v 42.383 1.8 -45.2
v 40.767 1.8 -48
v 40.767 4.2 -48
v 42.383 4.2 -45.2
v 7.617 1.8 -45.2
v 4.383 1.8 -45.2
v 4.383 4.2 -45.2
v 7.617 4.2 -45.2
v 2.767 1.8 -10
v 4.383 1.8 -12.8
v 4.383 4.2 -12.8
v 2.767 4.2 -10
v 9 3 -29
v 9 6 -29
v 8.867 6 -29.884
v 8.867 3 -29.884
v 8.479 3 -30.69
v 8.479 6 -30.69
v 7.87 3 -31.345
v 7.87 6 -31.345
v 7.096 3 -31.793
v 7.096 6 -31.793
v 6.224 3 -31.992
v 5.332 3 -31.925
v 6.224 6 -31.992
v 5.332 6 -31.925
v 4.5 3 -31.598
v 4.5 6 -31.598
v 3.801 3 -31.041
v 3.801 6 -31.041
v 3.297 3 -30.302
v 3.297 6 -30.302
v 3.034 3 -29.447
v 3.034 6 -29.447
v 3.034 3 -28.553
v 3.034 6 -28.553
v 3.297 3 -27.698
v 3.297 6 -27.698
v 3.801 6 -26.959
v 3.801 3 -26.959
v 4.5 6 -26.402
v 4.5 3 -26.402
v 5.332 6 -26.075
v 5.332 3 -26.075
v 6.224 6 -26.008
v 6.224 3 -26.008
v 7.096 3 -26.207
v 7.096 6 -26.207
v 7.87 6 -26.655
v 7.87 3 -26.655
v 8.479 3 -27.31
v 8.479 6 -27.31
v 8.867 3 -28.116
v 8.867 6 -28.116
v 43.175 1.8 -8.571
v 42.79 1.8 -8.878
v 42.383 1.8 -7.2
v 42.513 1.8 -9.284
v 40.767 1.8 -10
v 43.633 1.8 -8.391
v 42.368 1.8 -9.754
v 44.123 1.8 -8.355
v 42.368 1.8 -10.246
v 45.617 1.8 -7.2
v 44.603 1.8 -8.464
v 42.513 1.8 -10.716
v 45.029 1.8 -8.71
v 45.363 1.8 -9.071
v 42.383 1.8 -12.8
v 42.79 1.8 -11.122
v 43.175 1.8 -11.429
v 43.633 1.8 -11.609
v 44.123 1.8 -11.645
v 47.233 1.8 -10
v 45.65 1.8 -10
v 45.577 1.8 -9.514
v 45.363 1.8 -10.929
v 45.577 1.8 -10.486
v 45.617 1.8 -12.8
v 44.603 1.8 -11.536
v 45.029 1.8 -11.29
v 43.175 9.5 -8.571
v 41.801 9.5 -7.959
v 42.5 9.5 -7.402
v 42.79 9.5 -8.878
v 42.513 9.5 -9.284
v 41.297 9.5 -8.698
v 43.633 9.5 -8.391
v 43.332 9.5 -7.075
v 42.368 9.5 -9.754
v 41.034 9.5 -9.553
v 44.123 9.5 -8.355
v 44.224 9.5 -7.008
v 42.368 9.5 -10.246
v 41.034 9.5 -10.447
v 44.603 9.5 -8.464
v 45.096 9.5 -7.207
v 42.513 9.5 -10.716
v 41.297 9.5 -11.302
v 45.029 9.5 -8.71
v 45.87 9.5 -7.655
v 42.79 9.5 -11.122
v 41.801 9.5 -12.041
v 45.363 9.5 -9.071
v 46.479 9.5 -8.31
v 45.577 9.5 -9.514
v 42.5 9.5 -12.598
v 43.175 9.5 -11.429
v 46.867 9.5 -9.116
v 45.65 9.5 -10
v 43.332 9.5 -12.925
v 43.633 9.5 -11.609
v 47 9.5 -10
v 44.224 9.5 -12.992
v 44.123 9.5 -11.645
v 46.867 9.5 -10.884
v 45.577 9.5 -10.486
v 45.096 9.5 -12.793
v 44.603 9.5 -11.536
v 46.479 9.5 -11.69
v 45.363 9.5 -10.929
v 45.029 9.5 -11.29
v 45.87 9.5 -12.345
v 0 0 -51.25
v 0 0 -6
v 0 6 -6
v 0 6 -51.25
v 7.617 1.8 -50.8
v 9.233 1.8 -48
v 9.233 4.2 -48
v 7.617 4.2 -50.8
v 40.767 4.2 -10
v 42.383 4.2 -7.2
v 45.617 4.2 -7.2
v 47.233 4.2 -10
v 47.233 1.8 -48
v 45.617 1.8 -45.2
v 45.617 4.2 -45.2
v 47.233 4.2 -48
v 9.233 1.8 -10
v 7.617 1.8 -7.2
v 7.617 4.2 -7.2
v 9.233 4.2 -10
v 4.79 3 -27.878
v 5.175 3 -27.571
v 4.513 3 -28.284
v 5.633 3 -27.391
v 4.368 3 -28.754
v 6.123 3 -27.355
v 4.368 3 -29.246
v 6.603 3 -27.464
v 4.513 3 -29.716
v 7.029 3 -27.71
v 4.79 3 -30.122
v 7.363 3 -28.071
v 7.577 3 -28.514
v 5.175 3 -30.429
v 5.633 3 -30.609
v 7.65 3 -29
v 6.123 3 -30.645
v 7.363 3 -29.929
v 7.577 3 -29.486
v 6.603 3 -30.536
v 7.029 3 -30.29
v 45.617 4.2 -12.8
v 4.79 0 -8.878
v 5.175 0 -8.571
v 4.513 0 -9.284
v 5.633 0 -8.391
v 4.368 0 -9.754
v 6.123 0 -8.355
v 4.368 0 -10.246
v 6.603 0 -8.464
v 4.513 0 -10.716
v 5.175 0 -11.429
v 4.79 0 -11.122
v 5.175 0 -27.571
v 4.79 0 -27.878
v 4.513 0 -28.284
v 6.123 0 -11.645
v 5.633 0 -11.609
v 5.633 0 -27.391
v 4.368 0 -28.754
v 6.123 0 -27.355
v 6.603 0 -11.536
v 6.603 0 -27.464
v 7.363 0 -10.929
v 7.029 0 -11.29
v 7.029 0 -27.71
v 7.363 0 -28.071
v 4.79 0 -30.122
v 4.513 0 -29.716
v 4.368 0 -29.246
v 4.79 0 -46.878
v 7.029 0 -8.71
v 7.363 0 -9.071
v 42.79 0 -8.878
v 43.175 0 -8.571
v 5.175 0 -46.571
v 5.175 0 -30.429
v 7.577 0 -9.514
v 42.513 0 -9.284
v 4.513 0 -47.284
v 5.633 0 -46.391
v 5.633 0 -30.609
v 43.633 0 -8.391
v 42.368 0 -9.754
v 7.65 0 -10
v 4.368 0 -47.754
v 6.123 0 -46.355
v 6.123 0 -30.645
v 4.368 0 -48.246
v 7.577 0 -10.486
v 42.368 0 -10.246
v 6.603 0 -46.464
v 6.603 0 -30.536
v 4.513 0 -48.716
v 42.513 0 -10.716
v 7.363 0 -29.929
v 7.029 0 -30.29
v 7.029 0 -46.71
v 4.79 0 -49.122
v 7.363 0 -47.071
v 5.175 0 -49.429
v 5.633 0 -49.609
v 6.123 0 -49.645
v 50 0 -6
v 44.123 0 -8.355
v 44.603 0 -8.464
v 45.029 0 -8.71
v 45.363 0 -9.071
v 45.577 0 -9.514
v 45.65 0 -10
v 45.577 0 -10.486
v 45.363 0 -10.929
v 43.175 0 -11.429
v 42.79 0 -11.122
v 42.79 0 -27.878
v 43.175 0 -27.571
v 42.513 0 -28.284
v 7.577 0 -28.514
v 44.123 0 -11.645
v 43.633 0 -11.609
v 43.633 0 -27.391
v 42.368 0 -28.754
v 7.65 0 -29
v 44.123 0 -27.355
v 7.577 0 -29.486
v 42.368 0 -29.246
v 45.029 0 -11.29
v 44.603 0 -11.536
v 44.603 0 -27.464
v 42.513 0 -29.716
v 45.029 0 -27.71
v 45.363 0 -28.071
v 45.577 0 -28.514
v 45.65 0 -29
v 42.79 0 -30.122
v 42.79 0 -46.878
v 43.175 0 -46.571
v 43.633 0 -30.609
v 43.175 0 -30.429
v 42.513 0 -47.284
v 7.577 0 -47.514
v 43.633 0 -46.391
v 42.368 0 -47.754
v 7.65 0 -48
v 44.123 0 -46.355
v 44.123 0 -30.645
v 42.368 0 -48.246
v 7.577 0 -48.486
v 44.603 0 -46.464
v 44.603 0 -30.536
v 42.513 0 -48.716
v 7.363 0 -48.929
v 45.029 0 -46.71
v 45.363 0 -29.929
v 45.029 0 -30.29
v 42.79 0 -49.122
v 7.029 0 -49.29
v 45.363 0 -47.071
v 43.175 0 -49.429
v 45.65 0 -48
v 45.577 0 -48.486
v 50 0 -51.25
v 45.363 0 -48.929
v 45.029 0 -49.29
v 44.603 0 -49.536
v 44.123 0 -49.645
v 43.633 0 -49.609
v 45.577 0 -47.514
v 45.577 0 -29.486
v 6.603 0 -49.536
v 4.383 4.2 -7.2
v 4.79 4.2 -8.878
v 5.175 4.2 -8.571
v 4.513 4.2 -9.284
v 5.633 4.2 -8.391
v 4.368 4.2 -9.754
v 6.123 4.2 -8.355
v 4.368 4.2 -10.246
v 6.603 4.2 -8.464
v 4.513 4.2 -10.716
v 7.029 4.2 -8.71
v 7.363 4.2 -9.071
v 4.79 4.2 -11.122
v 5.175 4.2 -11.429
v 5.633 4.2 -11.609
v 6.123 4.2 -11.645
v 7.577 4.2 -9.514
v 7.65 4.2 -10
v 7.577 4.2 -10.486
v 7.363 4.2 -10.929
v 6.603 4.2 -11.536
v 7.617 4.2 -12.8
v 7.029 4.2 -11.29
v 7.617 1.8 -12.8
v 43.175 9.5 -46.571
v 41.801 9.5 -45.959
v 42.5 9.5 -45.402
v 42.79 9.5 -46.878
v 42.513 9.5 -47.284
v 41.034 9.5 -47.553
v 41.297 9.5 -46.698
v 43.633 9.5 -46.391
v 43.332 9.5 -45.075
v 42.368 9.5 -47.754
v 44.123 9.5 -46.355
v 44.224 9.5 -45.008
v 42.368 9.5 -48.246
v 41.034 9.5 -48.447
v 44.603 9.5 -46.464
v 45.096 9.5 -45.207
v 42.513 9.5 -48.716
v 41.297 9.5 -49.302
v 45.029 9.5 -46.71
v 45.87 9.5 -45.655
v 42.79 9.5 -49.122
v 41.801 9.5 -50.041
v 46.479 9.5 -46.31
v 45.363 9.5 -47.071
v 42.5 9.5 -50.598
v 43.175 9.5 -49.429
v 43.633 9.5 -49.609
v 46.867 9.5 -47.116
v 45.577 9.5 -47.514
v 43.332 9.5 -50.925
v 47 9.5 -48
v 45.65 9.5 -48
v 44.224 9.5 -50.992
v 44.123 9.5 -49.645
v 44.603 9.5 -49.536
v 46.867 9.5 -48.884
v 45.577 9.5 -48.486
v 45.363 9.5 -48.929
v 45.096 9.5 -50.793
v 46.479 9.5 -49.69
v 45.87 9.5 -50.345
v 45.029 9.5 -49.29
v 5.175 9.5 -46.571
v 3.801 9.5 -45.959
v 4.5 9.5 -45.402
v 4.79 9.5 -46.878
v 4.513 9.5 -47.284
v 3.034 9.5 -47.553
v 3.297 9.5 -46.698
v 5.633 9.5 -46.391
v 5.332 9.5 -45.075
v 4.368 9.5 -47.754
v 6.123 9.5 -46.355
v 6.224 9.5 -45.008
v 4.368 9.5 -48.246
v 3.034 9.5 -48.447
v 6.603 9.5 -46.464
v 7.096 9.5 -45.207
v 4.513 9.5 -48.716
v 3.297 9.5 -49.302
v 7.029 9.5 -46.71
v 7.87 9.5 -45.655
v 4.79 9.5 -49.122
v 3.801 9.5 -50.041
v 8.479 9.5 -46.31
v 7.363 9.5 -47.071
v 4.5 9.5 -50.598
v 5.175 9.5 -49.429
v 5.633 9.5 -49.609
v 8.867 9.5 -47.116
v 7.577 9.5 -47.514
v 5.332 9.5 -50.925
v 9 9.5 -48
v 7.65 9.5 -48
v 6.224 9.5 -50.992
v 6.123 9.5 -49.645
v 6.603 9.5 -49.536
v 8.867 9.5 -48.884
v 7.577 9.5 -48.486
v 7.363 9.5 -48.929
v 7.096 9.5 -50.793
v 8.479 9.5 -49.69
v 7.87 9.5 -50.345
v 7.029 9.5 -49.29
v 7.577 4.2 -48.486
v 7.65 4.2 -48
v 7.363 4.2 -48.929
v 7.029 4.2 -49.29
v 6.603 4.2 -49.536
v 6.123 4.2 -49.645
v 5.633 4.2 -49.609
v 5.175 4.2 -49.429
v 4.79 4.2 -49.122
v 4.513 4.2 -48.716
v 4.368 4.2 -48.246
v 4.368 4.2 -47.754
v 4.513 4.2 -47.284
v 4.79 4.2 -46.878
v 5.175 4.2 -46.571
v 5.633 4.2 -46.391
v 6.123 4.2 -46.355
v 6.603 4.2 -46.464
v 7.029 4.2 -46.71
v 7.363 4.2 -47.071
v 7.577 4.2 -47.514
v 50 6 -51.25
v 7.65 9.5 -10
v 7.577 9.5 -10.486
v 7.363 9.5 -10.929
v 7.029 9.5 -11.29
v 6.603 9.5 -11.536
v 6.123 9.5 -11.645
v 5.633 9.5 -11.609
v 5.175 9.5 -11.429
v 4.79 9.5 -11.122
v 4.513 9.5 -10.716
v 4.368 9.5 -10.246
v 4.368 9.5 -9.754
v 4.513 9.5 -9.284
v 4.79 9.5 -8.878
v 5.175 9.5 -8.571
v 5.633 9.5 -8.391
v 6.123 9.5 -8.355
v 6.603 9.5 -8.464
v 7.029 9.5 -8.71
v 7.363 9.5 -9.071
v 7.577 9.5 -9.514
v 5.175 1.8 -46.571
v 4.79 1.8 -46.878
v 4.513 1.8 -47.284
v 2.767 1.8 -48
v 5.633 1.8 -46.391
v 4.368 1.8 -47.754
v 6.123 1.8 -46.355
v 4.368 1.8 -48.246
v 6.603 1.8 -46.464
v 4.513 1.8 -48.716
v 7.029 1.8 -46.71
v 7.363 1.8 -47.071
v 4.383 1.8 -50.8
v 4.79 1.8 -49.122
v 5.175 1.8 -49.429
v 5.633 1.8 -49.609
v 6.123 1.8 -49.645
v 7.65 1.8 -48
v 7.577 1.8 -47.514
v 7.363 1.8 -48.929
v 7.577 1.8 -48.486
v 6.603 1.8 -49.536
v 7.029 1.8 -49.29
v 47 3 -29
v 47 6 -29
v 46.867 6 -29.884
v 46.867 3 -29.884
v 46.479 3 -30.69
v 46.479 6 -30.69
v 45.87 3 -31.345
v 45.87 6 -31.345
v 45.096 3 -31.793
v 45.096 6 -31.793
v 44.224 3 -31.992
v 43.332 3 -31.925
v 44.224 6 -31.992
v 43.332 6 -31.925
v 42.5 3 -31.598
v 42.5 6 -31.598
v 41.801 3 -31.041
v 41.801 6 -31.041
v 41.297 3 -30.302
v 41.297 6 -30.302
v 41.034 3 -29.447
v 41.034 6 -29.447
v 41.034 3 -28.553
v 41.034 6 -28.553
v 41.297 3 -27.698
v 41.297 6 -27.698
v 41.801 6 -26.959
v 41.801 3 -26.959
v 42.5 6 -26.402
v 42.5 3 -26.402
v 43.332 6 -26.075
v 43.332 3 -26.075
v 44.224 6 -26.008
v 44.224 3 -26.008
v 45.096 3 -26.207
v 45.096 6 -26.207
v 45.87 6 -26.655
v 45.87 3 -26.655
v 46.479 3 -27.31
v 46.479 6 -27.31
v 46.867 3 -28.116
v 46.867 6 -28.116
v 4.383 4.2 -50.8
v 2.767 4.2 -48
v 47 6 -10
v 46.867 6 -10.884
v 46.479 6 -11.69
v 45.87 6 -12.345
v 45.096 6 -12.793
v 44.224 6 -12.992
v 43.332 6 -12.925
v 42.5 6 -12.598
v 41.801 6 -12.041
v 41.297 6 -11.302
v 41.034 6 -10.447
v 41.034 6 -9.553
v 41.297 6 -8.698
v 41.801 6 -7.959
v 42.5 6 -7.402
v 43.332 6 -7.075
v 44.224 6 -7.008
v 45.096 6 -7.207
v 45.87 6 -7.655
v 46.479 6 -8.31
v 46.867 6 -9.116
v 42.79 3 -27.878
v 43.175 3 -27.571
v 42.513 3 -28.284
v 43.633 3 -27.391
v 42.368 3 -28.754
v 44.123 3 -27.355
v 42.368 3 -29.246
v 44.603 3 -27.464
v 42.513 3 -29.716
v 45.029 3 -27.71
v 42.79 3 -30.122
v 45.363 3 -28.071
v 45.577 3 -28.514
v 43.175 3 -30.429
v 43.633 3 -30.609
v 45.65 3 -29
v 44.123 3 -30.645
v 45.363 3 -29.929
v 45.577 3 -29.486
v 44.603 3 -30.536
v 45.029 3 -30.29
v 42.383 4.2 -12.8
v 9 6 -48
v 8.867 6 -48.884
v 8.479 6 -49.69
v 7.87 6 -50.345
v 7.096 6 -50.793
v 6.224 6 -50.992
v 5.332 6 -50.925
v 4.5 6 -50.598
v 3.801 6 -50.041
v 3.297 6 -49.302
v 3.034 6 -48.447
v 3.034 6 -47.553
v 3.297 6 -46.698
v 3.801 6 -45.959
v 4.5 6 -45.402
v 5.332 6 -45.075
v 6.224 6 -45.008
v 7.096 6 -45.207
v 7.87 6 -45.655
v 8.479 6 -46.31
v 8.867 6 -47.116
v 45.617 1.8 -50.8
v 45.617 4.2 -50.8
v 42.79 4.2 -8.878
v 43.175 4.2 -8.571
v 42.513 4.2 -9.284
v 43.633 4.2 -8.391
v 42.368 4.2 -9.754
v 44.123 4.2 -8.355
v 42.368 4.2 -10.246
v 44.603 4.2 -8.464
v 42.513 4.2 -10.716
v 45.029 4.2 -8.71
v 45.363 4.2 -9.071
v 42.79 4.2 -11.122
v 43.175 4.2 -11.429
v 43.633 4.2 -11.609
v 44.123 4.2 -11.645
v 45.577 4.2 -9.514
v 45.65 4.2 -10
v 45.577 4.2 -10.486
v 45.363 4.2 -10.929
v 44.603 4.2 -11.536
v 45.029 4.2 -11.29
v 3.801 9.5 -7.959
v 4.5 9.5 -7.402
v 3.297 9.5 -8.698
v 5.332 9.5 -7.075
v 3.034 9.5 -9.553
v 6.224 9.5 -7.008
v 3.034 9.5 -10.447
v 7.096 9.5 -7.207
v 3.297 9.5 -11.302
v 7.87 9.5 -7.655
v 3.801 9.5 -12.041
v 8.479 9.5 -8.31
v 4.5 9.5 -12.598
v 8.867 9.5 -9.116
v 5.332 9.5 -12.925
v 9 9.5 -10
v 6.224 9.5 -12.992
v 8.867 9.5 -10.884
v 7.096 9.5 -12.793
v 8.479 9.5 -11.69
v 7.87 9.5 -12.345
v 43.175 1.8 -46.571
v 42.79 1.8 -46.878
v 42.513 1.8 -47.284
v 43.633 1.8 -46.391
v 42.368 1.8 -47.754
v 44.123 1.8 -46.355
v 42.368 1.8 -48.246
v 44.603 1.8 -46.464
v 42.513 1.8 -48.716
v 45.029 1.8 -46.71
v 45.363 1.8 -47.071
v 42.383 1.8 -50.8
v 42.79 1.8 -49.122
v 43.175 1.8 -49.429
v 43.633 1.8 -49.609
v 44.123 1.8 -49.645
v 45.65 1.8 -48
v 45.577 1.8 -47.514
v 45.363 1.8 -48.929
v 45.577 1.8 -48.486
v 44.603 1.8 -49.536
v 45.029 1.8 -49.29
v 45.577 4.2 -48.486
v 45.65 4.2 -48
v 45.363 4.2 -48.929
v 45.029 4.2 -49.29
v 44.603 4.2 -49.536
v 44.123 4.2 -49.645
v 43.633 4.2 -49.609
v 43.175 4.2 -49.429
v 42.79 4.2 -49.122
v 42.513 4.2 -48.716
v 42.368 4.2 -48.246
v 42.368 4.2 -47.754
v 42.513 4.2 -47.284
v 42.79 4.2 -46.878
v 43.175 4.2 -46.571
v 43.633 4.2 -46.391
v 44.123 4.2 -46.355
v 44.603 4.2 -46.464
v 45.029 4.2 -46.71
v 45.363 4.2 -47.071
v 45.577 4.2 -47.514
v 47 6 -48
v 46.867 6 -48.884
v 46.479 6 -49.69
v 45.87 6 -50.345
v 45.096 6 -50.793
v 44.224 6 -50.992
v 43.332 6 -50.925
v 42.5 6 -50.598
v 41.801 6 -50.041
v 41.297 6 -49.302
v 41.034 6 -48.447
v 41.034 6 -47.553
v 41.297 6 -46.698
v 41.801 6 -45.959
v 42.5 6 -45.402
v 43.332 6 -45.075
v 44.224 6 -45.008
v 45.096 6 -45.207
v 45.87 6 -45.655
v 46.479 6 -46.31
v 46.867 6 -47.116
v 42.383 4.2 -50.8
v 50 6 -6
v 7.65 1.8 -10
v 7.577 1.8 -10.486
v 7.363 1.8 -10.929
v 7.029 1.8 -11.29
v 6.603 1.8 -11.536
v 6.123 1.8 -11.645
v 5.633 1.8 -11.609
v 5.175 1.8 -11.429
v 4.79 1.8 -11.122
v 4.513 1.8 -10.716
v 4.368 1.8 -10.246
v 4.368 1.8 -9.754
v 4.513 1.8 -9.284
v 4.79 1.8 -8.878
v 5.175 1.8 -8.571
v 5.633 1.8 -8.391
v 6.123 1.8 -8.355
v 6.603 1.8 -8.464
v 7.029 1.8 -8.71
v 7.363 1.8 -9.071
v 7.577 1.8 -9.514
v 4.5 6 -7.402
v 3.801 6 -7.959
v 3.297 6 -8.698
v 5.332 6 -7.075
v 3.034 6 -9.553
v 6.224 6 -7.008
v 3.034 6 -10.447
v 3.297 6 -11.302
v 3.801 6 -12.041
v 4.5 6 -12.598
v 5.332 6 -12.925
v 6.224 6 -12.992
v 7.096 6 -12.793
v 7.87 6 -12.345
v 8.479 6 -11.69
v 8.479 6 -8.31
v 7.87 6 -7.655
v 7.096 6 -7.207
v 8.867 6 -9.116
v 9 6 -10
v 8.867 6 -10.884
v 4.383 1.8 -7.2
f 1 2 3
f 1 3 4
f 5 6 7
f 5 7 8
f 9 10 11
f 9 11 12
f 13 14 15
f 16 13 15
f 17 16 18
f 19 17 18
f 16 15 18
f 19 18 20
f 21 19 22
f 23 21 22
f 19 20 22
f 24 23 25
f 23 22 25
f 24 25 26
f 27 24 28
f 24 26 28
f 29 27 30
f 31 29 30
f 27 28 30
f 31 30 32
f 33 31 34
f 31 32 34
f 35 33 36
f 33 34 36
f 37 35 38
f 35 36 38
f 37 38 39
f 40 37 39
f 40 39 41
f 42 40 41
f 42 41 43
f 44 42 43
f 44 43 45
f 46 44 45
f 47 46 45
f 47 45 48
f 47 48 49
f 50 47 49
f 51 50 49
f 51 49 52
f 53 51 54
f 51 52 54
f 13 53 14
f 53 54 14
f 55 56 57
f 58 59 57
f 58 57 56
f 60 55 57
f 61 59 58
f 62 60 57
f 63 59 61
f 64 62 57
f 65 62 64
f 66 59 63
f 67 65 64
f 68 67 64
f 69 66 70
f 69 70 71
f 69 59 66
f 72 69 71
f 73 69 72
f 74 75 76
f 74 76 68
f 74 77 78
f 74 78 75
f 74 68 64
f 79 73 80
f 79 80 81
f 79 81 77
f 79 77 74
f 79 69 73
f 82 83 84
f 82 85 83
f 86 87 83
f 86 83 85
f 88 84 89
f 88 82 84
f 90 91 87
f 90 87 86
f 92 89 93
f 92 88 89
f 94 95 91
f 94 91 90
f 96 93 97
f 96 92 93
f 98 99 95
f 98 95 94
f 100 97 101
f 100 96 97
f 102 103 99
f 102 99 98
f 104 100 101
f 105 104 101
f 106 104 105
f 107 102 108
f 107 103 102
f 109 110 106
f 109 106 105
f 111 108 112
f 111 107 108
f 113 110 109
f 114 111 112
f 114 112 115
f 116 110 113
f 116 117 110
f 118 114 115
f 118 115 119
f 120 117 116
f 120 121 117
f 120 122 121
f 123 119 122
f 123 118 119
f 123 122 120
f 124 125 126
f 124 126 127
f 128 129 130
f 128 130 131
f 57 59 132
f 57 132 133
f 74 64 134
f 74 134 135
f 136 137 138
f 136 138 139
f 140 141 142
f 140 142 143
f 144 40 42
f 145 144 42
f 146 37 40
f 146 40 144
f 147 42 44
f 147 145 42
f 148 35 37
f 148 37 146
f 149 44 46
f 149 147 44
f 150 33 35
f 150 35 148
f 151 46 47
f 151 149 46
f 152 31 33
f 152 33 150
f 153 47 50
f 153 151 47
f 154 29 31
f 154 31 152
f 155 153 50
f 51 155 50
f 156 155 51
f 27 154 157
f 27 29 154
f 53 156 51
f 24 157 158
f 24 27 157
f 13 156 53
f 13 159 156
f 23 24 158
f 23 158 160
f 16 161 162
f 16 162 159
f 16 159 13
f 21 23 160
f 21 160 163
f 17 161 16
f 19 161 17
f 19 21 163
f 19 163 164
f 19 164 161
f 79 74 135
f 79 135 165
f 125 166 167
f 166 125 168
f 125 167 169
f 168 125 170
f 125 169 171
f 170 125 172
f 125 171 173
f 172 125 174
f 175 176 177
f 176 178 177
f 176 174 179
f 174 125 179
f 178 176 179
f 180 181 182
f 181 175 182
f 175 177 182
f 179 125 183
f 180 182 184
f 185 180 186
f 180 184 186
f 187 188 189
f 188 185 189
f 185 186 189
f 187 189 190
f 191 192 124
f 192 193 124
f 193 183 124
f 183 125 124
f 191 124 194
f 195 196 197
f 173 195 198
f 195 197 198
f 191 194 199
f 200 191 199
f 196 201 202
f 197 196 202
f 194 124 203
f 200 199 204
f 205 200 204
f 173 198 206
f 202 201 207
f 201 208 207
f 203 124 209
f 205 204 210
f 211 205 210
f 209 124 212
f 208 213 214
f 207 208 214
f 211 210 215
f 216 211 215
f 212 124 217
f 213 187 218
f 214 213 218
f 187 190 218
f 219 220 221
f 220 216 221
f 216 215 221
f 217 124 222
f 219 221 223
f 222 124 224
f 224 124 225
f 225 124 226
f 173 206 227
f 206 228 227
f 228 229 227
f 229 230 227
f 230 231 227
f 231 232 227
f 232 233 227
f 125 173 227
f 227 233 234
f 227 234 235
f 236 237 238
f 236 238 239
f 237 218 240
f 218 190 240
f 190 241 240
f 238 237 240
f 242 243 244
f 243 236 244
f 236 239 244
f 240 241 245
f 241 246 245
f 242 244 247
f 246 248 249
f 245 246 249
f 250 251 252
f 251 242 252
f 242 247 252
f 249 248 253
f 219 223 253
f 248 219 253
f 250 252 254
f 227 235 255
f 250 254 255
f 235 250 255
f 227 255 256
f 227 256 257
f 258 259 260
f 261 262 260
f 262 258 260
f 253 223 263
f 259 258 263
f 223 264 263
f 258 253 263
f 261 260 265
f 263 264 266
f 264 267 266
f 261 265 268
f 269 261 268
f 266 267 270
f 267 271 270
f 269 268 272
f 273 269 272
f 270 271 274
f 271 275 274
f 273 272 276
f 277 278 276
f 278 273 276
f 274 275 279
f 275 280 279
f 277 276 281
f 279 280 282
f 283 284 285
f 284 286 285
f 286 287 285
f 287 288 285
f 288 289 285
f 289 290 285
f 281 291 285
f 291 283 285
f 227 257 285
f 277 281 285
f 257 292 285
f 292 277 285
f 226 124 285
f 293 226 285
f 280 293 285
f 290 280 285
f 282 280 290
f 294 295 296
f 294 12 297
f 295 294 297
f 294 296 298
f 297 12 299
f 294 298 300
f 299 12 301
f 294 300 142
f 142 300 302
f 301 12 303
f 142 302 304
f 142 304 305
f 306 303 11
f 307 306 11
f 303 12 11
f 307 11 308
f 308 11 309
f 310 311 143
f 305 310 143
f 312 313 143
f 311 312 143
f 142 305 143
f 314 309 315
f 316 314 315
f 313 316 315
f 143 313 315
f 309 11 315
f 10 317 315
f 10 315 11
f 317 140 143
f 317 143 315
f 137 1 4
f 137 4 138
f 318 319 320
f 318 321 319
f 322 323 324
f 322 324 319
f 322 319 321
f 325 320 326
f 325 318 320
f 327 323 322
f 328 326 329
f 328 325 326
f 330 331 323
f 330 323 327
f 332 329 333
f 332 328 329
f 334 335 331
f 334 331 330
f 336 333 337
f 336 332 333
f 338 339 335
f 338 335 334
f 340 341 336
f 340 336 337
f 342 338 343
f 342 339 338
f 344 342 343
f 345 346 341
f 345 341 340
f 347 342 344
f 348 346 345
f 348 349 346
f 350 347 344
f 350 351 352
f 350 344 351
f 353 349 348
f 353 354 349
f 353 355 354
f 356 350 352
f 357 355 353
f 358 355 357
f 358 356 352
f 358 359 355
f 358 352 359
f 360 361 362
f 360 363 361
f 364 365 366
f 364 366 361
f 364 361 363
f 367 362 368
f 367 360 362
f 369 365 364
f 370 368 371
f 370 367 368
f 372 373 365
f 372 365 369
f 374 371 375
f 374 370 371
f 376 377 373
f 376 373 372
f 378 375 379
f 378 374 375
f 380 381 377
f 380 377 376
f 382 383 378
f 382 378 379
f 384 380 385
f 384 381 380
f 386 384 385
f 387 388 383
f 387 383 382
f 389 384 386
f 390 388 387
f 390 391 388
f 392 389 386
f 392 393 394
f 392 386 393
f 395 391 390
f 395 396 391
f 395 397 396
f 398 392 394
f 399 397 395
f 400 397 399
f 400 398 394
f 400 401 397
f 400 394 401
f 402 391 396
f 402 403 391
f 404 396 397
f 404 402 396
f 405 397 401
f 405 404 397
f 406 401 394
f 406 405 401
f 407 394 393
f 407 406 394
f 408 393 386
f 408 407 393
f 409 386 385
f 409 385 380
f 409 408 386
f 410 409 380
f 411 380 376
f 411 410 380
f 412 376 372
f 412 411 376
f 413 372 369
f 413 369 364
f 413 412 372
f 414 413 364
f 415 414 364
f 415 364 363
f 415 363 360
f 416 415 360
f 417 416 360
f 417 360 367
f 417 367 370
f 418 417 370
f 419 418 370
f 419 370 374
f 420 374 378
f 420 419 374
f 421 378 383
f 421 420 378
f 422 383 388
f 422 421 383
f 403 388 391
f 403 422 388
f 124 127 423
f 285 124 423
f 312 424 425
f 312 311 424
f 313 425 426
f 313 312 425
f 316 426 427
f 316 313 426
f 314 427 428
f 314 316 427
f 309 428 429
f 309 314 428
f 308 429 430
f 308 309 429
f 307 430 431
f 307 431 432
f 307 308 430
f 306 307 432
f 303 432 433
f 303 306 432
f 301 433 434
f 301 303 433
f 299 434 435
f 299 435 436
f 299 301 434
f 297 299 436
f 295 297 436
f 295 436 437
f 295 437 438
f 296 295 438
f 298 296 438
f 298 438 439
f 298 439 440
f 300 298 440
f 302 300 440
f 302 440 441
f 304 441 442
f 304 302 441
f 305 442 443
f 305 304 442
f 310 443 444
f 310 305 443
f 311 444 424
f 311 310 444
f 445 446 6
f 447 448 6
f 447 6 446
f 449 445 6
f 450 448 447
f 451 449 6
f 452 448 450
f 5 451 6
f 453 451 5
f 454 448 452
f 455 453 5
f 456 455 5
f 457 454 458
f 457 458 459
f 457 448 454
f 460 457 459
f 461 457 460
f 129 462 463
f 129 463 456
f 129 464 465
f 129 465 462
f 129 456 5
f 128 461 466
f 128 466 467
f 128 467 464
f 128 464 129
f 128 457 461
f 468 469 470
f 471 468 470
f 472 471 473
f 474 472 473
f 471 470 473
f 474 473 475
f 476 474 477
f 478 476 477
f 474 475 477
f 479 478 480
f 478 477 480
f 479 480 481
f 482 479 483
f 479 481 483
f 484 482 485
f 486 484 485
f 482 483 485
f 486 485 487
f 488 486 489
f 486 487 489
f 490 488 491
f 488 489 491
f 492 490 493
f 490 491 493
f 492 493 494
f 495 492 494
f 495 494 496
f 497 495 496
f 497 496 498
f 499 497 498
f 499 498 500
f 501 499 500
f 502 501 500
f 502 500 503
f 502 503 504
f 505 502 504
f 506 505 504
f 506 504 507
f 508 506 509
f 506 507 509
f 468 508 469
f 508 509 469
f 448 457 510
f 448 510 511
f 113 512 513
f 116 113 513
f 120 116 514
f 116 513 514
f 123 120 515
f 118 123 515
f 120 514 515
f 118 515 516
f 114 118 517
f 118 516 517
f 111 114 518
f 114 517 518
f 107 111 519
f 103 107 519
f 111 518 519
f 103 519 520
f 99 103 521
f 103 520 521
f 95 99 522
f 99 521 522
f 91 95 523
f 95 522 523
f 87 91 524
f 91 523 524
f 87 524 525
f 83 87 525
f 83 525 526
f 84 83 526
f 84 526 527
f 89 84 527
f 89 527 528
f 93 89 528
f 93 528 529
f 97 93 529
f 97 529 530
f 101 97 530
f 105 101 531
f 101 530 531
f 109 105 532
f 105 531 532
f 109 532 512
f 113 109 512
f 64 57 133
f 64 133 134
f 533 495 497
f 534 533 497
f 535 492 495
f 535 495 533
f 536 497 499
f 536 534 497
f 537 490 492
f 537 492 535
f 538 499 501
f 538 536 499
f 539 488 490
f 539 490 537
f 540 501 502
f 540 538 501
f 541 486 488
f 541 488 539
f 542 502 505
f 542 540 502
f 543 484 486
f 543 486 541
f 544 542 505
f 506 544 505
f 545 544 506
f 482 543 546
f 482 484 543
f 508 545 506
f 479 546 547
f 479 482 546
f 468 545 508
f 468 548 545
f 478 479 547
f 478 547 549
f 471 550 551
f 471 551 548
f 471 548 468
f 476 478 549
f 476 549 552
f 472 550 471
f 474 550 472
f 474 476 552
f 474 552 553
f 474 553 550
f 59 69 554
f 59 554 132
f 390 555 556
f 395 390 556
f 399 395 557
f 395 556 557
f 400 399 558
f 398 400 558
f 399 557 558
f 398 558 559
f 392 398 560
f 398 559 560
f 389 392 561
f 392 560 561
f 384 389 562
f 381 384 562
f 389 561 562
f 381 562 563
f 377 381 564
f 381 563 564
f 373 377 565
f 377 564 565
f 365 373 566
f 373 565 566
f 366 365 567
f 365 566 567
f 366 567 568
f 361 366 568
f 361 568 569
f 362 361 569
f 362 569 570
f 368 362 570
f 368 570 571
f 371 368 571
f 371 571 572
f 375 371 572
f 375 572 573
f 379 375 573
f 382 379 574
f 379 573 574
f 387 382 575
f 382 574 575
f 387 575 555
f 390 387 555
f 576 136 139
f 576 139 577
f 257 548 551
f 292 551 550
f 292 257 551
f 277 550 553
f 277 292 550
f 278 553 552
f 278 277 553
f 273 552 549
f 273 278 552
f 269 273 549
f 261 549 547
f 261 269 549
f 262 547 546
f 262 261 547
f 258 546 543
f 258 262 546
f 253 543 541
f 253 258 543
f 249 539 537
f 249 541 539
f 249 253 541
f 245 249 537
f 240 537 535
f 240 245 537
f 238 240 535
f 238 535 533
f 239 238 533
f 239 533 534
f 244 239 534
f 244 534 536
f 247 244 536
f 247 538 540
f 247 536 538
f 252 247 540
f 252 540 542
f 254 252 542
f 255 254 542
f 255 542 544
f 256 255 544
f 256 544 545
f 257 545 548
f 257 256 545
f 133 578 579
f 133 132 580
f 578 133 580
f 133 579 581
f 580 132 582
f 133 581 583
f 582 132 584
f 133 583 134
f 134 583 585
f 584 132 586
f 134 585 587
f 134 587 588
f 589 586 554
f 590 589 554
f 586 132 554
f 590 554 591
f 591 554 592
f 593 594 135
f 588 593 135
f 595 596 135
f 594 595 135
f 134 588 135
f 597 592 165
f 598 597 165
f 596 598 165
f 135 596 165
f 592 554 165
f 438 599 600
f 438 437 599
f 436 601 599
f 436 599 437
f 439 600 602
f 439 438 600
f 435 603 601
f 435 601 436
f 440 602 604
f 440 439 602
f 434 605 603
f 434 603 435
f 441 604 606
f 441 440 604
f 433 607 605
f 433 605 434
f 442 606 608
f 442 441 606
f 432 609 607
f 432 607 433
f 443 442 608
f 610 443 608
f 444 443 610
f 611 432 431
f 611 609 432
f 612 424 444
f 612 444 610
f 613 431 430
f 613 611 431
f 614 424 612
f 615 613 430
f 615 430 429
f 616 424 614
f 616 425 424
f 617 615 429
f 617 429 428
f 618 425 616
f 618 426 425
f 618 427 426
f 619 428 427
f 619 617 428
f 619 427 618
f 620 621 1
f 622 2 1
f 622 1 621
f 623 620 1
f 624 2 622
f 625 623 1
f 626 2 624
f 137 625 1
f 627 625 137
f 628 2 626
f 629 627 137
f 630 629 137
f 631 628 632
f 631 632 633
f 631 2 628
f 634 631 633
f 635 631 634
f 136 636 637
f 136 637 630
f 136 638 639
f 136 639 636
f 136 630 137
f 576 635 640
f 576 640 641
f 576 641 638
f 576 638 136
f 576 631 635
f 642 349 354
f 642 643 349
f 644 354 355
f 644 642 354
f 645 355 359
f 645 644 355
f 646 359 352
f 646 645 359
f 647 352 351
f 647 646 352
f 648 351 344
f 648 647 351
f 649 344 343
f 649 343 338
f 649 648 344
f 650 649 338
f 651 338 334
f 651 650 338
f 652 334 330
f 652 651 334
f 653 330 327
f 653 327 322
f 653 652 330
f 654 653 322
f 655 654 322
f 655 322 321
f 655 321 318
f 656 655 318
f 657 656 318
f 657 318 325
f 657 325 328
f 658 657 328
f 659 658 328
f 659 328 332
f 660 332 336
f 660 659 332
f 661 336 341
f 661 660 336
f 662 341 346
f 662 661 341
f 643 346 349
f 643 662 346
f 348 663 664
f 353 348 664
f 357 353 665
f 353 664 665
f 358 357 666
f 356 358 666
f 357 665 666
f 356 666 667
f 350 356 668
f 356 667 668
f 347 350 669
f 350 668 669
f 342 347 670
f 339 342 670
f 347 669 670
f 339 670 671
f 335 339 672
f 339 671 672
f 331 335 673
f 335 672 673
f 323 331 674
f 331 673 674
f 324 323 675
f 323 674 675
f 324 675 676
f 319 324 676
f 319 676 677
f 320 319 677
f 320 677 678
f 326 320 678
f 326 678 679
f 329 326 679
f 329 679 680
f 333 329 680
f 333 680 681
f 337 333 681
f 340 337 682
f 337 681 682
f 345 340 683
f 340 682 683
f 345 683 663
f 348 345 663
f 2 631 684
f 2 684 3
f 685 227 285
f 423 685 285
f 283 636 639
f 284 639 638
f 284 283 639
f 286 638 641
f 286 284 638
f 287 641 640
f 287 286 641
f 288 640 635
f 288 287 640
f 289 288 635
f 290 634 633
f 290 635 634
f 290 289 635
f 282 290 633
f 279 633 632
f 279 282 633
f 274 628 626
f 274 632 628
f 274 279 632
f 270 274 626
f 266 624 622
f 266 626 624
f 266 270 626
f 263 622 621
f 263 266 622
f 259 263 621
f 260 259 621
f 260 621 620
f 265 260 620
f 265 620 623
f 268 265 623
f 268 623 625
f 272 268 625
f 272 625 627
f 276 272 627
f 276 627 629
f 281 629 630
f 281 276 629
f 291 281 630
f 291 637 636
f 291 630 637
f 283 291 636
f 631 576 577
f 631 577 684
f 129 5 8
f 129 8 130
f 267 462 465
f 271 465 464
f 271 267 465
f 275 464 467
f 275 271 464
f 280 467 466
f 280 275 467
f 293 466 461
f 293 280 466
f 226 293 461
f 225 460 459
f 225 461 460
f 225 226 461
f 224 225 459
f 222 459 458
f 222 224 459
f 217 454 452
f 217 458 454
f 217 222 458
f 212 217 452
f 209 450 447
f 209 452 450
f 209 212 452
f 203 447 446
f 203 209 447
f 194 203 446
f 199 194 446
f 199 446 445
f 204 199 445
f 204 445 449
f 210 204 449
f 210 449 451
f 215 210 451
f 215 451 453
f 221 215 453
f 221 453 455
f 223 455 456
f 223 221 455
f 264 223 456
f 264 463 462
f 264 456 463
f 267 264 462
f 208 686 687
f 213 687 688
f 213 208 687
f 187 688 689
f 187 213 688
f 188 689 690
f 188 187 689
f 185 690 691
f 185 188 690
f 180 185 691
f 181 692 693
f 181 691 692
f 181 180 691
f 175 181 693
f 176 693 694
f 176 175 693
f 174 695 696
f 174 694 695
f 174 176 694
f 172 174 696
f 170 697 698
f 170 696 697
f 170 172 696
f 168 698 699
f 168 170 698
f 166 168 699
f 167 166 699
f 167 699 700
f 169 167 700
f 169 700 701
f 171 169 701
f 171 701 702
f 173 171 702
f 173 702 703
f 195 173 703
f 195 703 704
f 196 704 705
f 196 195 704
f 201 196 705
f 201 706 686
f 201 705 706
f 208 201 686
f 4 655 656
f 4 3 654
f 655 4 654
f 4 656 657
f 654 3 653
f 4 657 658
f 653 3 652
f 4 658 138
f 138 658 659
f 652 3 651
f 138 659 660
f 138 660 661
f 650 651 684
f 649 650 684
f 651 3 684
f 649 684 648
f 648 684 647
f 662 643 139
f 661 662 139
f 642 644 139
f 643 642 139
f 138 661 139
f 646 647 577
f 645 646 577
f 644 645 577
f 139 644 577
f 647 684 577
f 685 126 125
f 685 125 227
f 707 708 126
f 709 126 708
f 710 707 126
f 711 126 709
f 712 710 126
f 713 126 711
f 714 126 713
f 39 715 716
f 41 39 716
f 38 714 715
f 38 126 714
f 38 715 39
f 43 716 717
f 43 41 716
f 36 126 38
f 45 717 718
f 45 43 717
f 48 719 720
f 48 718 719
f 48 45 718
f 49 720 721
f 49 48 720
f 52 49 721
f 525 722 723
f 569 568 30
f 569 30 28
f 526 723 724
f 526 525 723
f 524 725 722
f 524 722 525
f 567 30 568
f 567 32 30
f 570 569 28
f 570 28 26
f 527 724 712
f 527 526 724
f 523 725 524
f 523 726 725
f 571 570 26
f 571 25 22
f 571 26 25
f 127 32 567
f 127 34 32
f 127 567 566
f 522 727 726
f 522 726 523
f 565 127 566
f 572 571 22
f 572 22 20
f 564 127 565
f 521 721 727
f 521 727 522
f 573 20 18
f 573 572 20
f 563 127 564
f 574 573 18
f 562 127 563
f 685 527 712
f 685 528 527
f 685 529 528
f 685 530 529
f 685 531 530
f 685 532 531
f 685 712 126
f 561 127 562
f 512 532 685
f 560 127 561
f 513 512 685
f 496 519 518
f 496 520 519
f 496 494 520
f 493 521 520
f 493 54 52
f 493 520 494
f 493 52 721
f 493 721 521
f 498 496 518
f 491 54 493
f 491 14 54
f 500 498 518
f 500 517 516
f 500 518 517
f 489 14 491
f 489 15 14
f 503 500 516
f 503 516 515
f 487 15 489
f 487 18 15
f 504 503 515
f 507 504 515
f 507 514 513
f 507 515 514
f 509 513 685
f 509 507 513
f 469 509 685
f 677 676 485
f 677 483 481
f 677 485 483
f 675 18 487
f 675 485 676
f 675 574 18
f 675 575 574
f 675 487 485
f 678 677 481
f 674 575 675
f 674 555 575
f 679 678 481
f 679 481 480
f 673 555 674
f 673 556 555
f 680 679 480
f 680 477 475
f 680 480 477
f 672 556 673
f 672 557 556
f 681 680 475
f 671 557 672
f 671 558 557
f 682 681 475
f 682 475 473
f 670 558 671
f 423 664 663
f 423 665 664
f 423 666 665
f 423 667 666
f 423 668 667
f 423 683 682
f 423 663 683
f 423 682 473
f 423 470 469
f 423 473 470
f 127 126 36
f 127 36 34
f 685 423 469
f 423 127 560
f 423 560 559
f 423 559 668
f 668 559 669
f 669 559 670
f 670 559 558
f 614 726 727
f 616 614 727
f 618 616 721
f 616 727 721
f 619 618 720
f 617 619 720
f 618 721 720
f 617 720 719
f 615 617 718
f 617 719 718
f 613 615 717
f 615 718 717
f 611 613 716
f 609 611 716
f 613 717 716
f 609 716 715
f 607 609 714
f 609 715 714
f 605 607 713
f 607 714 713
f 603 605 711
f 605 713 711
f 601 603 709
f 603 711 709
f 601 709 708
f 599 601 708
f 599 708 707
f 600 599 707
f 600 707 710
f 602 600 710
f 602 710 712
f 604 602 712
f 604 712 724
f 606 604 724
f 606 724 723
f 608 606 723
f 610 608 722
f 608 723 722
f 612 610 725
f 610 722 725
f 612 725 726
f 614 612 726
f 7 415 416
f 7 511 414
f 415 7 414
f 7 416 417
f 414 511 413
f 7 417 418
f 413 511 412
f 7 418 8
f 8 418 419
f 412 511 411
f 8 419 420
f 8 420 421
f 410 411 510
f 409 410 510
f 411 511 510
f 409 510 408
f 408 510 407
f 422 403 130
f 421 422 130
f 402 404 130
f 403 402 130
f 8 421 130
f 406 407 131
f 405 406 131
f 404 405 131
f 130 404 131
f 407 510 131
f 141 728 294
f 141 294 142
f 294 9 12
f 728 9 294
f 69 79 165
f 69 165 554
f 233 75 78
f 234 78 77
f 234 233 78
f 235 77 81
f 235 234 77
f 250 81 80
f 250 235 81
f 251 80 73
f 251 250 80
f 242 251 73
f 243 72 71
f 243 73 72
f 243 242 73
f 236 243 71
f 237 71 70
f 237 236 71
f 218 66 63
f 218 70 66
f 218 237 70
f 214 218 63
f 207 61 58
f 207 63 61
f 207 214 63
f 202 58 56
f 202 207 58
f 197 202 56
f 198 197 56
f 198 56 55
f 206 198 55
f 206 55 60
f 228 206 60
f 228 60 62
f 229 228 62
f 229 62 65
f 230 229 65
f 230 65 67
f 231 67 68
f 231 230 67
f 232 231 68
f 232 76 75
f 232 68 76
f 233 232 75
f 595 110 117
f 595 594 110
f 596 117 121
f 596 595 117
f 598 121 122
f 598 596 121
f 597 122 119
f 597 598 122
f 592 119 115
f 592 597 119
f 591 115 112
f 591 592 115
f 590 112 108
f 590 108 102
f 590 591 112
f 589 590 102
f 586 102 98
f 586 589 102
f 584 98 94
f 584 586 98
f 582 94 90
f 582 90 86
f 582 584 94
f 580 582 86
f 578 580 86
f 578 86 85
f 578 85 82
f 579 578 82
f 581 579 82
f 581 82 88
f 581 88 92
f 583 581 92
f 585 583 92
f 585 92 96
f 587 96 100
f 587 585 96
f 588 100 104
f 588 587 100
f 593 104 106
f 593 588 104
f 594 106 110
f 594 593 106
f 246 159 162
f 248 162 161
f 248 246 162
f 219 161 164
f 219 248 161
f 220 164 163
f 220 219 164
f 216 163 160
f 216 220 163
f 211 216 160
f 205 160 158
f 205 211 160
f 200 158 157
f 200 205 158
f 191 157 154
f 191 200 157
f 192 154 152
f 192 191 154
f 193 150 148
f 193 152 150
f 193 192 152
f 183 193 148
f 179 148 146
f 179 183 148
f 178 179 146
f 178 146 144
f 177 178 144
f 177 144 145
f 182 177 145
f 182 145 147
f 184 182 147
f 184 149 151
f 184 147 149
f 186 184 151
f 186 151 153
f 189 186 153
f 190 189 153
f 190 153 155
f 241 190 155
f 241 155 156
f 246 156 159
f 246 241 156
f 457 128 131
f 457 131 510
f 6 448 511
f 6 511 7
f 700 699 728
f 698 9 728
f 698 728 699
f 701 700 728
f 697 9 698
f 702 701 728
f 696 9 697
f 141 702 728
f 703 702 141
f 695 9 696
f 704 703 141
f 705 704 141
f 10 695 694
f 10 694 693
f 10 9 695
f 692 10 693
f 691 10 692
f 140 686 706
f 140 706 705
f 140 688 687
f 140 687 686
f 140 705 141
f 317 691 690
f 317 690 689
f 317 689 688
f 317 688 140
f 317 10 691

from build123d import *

# Parameters (mm, degrees)
SKETCH2_W           = 50
SKETCH2_H           = 55
SKETCH2_R           = 1.65
BOSS_EXTRUDE2_DEPTH = 6
CUT_EXTRUDE1_START  = 1.8
CUT_EXTRUDE1_DEPTH  = 2.4
SKETCH4_R           = 3
SKETCH4_R_2         = 1.65
BOSS_EXTRUDE3_DEPTH = 3.5
SKETCH5_R           = 3
CUT_EXTRUDE2_DEPTH  = 3
SKETCH6_W           = 50
SKETCH6_H           = 3.75
SKETCH6_H_2         = 6
CUT_EXTRUDE3_DEPTH  = 10


with BuildPart() as part:
    # Sketch2 → Boss-Extrude2 (new body)
    with BuildSketch(Plane(origin=(0, 0, 0), x_dir=(1, 0, 0), z_dir=(0, 1, 0))):
        with Locations((25, 27.5)):
            Rectangle(SKETCH2_W, SKETCH2_H)
        with Locations((6, 10)):
            Circle(SKETCH2_R, mode=Mode.SUBTRACT)
        with Locations((44, 10)):
            Circle(SKETCH2_R, mode=Mode.SUBTRACT)
        with Locations((44, 48)):
            Circle(SKETCH2_R, mode=Mode.SUBTRACT)
        with Locations((6, 48)):
            Circle(SKETCH2_R, mode=Mode.SUBTRACT)
        with Locations((6, 29)):
            Circle(SKETCH2_R, mode=Mode.SUBTRACT)
        with Locations((44, 29)):
            Circle(SKETCH2_R, mode=Mode.SUBTRACT)
    extrude(amount=BOSS_EXTRUDE2_DEPTH)

    # Sketch3 → Cut-Extrude1 (cut)
    with BuildSketch(Plane(origin=(0, 0, 0), x_dir=(1, 0, 0), z_dir=(0, 1, 0)).offset(CUT_EXTRUDE1_START)):
        Polygon((9.233161507, 48), (7.616580754, 50.8), (4.383419246, 50.8), (2.766838493, 48), (4.383419246, 45.2), (7.616580754, 45.2), align=None)
        Polygon((47.233161507, 48), (45.616580754, 50.8), (42.383419246, 50.8), (40.766838493, 48), (42.383419246, 45.2), (45.616580754, 45.2), align=None)
        Polygon((47.233161507, 10), (45.616580754, 12.8), (42.383419246, 12.8), (40.766838493, 10), (42.383419246, 7.2), (45.616580754, 7.2), align=None)
        Polygon((9.233161507, 10), (7.616580754, 12.8), (4.383419246, 12.8), (2.766838493, 10), (4.383419246, 7.2), (7.616580754, 7.2), align=None)
    extrude(amount=CUT_EXTRUDE1_DEPTH, mode=Mode.SUBTRACT)

    # Sketch4 → Boss-Extrude3 (add)
    with BuildSketch(Plane(origin=(0, 6, 0), x_dir=(1, 0, 0), z_dir=(0, 1, 0))):
        with Locations((6, 10)):
            Circle(SKETCH4_R)
        with Locations((6, 10)):
            Circle(SKETCH4_R_2, mode=Mode.SUBTRACT)
        with Locations((44, 10)):
            Circle(SKETCH4_R)
        with Locations((44, 10)):
            Circle(SKETCH4_R_2, mode=Mode.SUBTRACT)
        with Locations((6, 48)):
            Circle(SKETCH4_R)
        with Locations((6, 48)):
            Circle(SKETCH4_R_2, mode=Mode.SUBTRACT)
        with Locations((44, 48)):
            Circle(SKETCH4_R)
        with Locations((44, 48)):
            Circle(SKETCH4_R_2, mode=Mode.SUBTRACT)
    extrude(amount=BOSS_EXTRUDE3_DEPTH)

    # Sketch5 → Cut-Extrude2 (cut)
    with BuildSketch(Plane(origin=(0, 6, 0), x_dir=(1, 0, 0), z_dir=(0, 1, 0))):
        with Locations((6, 29)):
            Circle(SKETCH5_R)
        with Locations((44, 29)):
            Circle(SKETCH5_R)
    extrude(amount=-CUT_EXTRUDE2_DEPTH, mode=Mode.SUBTRACT)

    # Sketch6 → Cut-Extrude3 (cut)
    with BuildSketch(Plane(origin=(0, 6, 0), x_dir=(1, 0, 0), z_dir=(0, 1, 0))):
        with Locations((25, 53.125)):
            Rectangle(SKETCH6_W, SKETCH6_H)
        with Locations((25, 3)):
            Rectangle(SKETCH6_W, SKETCH6_H_2)
    extrude(amount=-CUT_EXTRUDE3_DEPTH, mode=Mode.SUBTRACT)


solid = part.part
